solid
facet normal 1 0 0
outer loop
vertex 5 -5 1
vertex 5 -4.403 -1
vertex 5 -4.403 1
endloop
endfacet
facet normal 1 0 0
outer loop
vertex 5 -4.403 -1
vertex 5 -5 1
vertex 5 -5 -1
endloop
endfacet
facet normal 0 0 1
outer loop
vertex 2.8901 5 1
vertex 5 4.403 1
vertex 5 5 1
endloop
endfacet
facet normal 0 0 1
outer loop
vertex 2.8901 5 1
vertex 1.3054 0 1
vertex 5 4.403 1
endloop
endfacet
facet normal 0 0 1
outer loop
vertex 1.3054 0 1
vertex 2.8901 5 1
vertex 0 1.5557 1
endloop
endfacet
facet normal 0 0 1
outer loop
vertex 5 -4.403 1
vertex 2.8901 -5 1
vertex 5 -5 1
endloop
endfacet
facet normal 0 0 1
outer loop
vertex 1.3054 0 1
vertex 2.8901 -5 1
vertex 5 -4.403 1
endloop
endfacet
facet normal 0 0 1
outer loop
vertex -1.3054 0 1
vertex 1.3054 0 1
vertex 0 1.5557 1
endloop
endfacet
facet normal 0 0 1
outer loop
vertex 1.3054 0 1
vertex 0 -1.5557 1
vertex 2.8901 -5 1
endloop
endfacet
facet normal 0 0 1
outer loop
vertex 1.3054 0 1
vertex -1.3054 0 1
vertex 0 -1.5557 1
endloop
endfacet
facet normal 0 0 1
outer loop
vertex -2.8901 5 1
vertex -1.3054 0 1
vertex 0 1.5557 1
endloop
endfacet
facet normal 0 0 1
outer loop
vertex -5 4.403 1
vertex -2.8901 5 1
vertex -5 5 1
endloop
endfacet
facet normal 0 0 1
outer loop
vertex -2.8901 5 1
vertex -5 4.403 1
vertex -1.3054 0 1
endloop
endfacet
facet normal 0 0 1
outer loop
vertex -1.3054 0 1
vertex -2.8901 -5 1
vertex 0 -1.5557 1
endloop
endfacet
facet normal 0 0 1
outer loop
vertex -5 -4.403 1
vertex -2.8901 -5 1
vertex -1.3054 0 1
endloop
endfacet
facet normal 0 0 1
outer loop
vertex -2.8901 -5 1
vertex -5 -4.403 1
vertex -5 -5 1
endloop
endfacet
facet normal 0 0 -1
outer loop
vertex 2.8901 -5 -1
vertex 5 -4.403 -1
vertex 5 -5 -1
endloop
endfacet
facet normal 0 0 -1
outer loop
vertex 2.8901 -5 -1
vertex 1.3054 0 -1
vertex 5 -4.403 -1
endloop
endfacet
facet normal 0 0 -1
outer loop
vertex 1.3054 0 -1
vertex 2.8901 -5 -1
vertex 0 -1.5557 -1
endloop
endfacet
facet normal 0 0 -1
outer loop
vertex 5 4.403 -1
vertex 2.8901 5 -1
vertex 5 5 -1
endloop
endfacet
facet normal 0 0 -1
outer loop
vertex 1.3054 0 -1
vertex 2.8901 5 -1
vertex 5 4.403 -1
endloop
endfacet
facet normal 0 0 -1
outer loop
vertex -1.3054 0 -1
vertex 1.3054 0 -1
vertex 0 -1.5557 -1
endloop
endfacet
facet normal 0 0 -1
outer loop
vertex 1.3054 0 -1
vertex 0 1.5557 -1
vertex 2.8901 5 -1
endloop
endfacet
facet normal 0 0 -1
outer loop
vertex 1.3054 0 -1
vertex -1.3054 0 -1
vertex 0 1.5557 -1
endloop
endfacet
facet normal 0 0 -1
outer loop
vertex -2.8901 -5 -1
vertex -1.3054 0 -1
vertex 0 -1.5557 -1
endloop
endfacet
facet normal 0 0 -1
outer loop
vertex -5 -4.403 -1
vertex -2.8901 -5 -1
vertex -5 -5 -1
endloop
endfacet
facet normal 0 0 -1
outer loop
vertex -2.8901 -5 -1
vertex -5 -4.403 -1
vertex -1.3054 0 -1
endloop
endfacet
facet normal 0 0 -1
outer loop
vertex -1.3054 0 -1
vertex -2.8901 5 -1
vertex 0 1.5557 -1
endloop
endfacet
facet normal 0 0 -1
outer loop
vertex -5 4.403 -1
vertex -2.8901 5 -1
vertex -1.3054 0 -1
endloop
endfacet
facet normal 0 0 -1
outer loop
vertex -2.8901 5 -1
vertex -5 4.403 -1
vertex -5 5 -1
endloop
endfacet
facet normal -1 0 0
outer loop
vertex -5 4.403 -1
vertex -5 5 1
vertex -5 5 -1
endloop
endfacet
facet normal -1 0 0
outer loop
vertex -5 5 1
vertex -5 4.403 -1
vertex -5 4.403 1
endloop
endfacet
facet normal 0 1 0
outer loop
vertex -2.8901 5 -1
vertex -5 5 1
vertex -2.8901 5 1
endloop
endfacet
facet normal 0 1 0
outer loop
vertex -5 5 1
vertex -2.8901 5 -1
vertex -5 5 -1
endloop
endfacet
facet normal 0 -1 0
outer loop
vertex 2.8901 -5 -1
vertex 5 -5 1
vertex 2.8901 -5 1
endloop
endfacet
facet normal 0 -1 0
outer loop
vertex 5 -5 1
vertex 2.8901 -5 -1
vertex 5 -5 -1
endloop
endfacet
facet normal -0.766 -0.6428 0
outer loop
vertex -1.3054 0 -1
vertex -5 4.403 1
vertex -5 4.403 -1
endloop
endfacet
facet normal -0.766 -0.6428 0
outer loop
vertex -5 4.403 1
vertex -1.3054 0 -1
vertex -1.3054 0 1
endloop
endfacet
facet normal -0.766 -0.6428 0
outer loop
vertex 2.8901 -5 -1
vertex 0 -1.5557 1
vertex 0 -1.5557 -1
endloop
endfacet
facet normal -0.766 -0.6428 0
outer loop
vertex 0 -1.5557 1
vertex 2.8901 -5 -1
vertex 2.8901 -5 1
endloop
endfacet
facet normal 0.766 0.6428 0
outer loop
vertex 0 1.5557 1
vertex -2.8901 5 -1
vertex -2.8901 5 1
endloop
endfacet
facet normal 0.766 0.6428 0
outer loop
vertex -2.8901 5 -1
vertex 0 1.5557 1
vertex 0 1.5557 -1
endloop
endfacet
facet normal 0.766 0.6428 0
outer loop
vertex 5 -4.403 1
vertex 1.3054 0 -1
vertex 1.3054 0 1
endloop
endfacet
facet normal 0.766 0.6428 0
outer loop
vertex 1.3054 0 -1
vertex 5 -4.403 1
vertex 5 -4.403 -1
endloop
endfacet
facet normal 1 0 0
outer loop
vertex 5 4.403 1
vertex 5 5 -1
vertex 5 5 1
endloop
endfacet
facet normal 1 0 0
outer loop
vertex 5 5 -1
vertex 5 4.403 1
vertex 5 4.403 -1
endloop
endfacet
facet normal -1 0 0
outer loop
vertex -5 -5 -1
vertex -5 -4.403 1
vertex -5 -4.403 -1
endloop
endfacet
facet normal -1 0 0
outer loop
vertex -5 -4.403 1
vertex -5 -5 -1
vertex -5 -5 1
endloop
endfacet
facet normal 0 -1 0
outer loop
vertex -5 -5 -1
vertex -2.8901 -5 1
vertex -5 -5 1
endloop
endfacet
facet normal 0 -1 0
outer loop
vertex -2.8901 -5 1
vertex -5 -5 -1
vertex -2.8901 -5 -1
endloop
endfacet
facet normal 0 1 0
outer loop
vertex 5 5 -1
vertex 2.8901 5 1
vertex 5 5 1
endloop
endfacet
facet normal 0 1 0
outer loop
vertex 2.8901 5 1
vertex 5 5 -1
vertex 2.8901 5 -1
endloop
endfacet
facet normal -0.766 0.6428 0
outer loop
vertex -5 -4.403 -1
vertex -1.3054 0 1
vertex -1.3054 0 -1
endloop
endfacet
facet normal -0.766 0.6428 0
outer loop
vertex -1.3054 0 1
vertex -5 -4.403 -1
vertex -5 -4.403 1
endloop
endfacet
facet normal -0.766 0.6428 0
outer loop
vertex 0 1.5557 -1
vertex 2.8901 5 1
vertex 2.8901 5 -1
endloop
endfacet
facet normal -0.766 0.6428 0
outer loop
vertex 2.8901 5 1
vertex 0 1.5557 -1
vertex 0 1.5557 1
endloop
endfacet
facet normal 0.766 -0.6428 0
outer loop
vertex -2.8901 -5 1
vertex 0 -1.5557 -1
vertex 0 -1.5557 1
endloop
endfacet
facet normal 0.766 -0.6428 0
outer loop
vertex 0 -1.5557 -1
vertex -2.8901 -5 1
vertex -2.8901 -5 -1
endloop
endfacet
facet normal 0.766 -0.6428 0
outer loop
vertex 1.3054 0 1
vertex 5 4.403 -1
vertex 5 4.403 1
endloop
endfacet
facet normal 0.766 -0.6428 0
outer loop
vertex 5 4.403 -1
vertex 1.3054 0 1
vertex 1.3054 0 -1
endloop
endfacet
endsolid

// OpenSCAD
//=============================================================================
// Icon used for the Delete operation: a big 'X'.
//=============================================================================

module Diagonal() {
  intersection() {
    cube([10, 10, 2], center = true);
    rotate([0, 0, 40]) cube([2, 20, 4], center = true);
  }
}

module X() {
  union() {
    Diagonal();
    mirror([0, 1, 0]) Diagonal();
  }
}

module DeleteIcon() {
  X();
}

$fn = 30;
DeleteIcon();
